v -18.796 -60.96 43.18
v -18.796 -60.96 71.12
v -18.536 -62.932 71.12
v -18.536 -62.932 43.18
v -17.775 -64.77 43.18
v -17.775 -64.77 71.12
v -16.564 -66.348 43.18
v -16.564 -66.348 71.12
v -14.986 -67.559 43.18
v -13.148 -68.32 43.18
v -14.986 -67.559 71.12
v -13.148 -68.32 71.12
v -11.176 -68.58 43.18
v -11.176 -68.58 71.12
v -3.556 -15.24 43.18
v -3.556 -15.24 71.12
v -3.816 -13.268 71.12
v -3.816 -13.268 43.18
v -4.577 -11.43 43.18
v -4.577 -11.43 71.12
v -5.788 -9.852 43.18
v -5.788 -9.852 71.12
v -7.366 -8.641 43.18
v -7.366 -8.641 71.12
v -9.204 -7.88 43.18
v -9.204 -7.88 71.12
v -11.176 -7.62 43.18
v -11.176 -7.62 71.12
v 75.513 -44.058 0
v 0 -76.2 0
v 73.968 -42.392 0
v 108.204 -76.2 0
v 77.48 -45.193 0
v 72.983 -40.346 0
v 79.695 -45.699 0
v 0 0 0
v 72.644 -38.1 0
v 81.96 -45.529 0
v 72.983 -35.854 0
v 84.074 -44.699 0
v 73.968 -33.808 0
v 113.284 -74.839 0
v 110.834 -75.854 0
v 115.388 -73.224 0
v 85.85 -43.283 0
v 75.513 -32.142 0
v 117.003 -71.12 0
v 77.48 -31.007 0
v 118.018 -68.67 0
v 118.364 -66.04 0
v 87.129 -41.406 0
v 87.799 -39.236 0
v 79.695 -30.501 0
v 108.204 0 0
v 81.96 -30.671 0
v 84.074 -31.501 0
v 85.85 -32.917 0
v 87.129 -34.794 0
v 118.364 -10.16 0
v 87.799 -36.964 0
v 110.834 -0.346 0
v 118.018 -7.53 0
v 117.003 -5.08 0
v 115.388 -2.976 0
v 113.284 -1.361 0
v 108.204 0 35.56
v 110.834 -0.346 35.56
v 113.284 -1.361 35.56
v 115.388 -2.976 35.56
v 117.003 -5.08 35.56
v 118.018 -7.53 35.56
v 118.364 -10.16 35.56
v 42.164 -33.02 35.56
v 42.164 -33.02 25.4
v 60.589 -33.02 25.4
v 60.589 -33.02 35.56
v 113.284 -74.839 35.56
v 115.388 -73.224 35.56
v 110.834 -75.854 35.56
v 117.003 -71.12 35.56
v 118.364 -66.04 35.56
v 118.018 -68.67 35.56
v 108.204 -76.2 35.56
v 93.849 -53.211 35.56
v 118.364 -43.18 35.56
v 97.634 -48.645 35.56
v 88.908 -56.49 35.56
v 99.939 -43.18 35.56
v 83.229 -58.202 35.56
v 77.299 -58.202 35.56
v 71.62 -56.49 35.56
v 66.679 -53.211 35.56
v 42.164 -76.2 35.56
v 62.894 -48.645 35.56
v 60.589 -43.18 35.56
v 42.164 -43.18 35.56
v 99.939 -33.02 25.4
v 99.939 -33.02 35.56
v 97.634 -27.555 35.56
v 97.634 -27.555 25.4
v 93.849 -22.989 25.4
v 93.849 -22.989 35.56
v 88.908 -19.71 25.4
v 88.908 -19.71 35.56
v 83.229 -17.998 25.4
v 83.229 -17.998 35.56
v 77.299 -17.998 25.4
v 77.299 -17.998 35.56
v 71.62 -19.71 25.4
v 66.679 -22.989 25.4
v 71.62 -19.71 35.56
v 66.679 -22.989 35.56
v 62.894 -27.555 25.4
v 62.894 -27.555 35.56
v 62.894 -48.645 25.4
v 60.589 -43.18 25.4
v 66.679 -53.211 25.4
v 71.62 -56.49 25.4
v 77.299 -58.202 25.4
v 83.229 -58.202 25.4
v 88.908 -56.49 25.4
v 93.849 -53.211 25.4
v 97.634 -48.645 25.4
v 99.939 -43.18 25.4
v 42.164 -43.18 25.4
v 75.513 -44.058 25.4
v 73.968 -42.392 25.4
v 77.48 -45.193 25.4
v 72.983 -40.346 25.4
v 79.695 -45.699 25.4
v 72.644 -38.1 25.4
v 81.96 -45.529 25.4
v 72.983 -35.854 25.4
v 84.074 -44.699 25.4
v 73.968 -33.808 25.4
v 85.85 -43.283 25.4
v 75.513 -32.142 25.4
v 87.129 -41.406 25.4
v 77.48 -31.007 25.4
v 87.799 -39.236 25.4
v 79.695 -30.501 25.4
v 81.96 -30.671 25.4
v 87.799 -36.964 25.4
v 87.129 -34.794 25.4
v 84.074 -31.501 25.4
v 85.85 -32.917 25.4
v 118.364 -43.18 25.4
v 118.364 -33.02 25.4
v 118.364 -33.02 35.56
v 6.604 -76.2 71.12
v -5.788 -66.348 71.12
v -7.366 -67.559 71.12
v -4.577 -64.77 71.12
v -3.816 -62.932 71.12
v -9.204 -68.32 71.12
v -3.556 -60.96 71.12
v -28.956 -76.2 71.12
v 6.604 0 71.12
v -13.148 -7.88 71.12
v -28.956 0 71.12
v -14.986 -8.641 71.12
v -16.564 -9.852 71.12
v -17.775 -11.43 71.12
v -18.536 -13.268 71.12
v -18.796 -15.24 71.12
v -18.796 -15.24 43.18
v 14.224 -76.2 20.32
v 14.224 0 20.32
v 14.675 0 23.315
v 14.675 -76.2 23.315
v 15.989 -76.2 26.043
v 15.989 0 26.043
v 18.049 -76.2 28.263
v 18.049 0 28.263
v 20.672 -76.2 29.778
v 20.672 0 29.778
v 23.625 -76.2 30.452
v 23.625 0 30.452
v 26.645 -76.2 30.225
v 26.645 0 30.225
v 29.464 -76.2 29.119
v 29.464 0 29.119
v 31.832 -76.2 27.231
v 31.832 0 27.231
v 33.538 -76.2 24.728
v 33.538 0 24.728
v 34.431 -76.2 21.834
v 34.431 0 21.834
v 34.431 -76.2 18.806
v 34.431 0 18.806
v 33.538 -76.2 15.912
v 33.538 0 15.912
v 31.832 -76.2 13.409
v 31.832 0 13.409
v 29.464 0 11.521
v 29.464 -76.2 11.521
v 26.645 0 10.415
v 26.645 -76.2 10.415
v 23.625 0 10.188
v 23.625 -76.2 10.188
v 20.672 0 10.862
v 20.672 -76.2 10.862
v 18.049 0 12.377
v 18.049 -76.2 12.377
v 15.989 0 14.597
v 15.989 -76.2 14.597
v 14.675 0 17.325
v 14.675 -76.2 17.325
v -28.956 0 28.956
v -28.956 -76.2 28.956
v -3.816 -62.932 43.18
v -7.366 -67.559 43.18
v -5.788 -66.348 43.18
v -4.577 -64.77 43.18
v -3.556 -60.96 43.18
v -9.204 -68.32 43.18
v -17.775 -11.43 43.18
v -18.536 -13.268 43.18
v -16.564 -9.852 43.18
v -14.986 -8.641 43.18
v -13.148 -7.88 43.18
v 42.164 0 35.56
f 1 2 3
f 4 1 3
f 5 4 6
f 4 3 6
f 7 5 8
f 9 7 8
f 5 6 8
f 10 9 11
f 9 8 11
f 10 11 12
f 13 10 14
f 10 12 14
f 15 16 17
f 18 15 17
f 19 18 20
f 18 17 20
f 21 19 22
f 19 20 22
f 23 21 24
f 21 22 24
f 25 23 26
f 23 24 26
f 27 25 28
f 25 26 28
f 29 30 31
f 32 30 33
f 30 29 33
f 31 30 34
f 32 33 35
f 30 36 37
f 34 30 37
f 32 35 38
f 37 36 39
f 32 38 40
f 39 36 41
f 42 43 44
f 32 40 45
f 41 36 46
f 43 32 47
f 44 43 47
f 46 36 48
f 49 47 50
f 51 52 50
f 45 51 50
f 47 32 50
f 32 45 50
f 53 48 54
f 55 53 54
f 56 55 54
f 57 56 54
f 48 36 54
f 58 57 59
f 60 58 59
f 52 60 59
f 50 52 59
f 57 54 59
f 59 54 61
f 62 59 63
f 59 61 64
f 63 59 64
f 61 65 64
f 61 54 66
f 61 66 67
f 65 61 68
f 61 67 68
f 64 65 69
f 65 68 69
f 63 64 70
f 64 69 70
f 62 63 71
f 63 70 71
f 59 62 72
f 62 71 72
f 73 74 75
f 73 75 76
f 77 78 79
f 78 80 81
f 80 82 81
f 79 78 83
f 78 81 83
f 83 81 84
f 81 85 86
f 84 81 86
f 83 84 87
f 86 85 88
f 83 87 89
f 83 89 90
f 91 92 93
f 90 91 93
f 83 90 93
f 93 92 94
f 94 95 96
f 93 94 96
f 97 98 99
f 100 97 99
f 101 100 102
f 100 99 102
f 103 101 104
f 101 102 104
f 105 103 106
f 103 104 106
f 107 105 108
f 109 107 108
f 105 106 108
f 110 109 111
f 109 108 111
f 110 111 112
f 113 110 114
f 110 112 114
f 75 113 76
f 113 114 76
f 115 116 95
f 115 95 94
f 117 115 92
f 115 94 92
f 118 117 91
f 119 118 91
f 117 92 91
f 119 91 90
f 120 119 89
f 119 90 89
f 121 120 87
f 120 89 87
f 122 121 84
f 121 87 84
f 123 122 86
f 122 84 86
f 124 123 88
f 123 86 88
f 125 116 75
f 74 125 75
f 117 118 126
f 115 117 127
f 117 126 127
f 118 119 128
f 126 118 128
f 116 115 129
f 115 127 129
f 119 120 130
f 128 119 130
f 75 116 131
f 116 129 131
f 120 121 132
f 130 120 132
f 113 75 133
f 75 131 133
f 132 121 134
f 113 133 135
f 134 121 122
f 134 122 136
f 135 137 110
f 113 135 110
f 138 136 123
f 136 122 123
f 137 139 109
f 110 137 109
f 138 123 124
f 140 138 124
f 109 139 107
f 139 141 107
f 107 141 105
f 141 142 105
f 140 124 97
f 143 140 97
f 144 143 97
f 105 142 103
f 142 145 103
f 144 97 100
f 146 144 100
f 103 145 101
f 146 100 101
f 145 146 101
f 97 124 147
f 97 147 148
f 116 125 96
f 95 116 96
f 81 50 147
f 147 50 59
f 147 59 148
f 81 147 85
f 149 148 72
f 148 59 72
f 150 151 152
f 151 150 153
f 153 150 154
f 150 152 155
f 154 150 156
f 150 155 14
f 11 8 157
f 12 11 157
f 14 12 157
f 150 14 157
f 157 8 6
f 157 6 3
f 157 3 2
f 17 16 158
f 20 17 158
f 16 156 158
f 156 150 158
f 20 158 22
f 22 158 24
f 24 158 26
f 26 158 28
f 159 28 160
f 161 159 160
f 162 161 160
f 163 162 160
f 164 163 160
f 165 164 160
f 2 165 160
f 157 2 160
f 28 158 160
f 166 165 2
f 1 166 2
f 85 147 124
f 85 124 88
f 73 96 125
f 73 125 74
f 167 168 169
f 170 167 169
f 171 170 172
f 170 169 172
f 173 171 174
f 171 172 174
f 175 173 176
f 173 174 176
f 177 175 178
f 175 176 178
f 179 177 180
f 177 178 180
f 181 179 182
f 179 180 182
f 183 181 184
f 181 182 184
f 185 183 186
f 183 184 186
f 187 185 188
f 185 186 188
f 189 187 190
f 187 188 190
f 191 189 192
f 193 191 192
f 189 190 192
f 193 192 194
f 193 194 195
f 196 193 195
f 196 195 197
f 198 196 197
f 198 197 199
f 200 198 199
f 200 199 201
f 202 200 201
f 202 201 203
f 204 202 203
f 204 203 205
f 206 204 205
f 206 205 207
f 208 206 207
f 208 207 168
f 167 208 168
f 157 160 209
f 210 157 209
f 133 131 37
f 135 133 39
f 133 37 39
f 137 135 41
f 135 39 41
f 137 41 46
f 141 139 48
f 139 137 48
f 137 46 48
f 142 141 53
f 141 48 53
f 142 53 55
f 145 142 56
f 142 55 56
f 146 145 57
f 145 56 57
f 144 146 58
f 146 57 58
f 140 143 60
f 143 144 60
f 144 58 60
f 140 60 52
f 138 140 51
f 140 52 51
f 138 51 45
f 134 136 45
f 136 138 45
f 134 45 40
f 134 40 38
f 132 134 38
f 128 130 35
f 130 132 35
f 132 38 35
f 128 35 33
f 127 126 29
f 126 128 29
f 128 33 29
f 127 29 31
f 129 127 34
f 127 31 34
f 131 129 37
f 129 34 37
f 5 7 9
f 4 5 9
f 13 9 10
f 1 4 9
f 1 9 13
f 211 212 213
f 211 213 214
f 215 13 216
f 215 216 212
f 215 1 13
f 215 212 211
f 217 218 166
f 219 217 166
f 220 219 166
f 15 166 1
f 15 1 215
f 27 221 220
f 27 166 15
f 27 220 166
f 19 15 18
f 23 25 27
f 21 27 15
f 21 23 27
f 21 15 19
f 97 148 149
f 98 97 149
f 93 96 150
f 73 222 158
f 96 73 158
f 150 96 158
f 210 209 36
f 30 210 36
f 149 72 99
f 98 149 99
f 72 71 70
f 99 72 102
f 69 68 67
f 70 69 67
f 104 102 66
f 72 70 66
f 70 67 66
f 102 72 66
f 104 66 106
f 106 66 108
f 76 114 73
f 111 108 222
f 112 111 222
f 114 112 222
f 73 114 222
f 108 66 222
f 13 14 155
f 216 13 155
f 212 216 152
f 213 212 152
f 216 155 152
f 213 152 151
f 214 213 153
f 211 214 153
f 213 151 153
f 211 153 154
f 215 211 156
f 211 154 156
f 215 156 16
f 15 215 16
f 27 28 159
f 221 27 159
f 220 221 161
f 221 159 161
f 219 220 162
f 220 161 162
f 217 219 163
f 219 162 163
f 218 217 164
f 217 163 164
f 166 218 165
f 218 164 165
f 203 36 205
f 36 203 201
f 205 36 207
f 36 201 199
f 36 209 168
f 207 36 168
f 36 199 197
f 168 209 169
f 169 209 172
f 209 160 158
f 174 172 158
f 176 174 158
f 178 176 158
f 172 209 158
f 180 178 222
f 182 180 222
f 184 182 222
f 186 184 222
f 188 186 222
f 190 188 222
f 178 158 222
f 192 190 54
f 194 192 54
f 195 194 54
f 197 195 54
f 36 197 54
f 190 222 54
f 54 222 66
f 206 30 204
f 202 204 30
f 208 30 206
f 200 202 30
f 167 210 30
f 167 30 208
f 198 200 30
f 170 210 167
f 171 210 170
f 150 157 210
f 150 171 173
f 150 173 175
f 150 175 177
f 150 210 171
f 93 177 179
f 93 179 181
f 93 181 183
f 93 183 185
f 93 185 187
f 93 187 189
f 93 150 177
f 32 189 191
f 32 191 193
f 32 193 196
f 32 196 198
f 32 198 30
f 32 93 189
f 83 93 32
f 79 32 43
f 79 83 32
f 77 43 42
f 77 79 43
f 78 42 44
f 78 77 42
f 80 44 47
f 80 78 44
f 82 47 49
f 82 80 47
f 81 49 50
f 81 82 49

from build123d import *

# Parameters (mm, degrees)
F1_DEPTH       = 76.2
F3_DEPTH       = 27.94
F5_D           = 15.24
F5_CBORE_D     = 40.64
F5_CBORE_DEPTH = 10.16
F6_W           = 10.16
F6_H           = 10.16
F7_DEPTH       = 76.2
F8_R           = 10.16
F9_DEPTH       = 76.201
F10_R          = 10.16


with BuildPart() as f1:
    # F0 (on Front) → F1 (new body)
    with BuildSketch(Plane.XZ):
        Polygon((-28.956, 28.956), (0, 0), (118.364, 0), (118.364, 35.56), (42.164, 35.56), (6.604, 71.12), (-28.956, 71.12), align=None)
    extrude(amount=F1_DEPTH)

    # F2 (on face) → F3 (cut)
    with BuildSketch(Plane.XY.offset(71.12)):
        with BuildLine():
            ThreePointArc((-11.176, -7.62), (-16.564154, -9.851846), (-18.796, -15.24))
            Line((-18.796, -15.24), (-18.796, -60.96))
            ThreePointArc((-18.796, -60.96), (-16.564154, -66.348154), (-11.176, -68.58))
            ThreePointArc((-11.176, -68.58), (-5.787846, -66.348154), (-3.556, -60.96))
            Line((-3.556, -60.96), (-3.556, -15.24))
            ThreePointArc((-3.556, -15.24), (-5.787846, -9.851846), (-11.176, -7.62))
        make_face()
    extrude(amount=-F3_DEPTH, mode=Mode.SUBTRACT)

    # F5 (through all)
    with Locations(Plane.XY.offset(35.56)):
        with Locations((80.264, -38.1)):
            CounterBoreHole(F5_D / 2, F5_CBORE_D / 2, F5_CBORE_DEPTH)

    # F6 (on face) → F7 (cut)
    with BuildSketch(Plane.YZ.offset(118.364)):
        with Locations((-38.1, 30.48)):
            Rectangle(F6_W, F6_H)
    extrude(amount=-F7_DEPTH, mode=Mode.SUBTRACT)

    # F8 (on face) → F9 (cut, through all)
    with BuildSketch(Plane(origin=(0, 0, 0), x_dir=(-1, 0, 0), z_dir=(0, 1, 0))):
        with Locations((-24.384, 20.32)):
            Circle(F8_R)
    extrude(amount=-F9_DEPTH, mode=Mode.SUBTRACT)

    # F10
    f10_edges = [f1.edges().sort_by_distance(p)[0] for p in [
        (118.364, -76.2, 17.78),
        (118.364, 0, 17.78),
    ]]
    fillet(f10_edges, radius=F10_R)


solid = f1.part
